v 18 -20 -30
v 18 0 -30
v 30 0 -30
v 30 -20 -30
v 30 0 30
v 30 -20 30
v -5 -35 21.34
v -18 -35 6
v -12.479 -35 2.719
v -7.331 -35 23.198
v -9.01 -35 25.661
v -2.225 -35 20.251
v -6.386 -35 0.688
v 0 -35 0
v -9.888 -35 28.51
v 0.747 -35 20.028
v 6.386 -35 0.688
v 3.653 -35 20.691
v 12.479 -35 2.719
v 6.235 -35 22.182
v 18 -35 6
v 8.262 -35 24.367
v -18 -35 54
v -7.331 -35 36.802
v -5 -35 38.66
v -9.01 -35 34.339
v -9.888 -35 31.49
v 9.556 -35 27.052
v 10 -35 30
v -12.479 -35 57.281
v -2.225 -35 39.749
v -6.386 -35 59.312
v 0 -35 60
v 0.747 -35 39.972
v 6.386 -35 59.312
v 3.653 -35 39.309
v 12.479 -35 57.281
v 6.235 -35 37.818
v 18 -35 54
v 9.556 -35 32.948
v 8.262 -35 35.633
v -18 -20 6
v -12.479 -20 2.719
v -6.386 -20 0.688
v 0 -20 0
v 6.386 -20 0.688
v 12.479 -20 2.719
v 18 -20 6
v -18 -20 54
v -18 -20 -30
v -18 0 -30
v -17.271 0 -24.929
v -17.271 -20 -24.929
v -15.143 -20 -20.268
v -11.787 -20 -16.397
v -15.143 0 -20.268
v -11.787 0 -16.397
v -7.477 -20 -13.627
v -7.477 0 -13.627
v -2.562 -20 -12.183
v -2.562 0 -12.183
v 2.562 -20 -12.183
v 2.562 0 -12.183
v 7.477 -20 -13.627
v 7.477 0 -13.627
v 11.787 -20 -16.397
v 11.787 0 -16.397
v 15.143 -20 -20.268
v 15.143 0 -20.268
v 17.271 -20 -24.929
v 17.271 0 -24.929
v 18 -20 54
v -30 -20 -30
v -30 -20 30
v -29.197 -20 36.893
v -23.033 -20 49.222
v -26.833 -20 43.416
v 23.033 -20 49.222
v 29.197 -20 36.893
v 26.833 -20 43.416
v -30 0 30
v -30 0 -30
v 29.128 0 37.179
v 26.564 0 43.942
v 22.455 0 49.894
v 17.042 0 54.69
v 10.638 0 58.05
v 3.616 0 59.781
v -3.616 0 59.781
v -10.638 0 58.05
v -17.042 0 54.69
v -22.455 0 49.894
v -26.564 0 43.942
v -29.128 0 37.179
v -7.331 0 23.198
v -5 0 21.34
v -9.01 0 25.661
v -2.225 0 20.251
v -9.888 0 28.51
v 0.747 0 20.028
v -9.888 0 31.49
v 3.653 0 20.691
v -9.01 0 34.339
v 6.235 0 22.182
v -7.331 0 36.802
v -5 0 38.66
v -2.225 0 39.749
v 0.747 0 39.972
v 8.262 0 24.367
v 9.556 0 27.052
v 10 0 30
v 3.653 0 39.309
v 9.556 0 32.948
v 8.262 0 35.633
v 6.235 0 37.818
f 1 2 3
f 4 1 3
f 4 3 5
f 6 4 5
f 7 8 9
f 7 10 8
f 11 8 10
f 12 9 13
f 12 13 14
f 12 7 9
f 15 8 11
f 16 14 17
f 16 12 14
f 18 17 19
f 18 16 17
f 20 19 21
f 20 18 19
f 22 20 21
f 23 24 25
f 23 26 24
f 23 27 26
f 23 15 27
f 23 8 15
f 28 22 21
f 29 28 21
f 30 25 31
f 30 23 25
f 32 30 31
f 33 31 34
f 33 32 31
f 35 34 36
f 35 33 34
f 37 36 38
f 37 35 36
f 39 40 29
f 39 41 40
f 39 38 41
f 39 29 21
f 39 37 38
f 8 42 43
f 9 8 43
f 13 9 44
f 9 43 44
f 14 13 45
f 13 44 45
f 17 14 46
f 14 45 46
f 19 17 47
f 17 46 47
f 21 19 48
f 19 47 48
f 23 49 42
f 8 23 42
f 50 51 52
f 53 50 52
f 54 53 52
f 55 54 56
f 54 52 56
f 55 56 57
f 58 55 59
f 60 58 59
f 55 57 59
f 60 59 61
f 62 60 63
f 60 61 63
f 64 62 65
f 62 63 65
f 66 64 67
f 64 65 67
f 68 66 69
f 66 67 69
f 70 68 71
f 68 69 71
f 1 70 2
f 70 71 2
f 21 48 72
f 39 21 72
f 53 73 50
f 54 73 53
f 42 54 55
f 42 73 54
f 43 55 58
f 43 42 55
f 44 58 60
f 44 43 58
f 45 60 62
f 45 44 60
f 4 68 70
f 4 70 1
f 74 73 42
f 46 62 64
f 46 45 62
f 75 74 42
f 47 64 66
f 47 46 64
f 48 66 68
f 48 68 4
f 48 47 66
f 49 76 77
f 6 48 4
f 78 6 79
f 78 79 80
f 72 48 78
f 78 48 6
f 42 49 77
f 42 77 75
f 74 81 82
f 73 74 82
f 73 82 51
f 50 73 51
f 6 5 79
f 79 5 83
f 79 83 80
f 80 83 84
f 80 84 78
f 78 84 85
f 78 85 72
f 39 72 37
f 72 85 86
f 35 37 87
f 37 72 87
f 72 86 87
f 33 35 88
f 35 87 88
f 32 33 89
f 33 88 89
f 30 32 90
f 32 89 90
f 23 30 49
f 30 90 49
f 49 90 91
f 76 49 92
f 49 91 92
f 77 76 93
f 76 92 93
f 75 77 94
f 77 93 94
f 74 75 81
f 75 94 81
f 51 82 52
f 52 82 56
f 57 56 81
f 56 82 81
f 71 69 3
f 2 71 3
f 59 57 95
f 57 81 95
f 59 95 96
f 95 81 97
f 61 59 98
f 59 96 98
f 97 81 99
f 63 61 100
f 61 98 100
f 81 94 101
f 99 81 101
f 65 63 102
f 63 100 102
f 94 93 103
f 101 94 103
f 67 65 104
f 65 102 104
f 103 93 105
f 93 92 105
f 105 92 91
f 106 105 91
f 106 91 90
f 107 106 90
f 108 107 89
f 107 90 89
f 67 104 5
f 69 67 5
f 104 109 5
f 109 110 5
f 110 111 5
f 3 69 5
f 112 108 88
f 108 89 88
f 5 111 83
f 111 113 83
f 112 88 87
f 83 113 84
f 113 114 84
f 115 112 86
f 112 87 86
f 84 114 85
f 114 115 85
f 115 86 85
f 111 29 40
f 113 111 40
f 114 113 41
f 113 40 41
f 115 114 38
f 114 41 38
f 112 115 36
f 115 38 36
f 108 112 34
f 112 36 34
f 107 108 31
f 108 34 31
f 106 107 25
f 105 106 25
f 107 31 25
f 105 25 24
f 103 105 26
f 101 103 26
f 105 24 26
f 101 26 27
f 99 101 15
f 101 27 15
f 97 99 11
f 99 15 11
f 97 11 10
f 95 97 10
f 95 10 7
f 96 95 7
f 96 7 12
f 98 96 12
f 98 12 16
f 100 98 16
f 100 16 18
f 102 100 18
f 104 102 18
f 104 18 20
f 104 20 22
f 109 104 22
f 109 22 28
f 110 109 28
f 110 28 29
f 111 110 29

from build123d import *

# Parameters (mm, degrees)
F1_DEPTH = 20
F3_DEPTH = 15
F4_R     = 10
F5_DEPTH = 35.001


with BuildPart() as f1:
    # F0 (on Front) → F1 (new body)
    with BuildSketch(Plane.XZ):
        with BuildLine():
            Line((18, -30), (30, -30))
            Line((30, -30), (30, 30))
            ThreePointArc((30, 30), (0, 60), (-30, 30))
            Line((-30, 30), (-30, -30))
            Line((-30, -30), (-18, -30))
            ThreePointArc((-18, -30), (0, -12), (18, -30))
        make_face()
    extrude(amount=F1_DEPTH)

    # F2 (on face) → F3 (join)
    with BuildSketch(Plane.XZ.offset(20)):
        with BuildLine():
            Line((-18, 30), (-18, 6))
            ThreePointArc((-18, 6), (0, 0), (18, 6))
            Line((18, 6), (18, 30))
            Line((18, 30), (18, 54))
            ThreePointArc((18, 54), (0, 60), (-18, 54))
            Line((-18, 54), (-18, 30))
        make_face()
    extrude(amount=F3_DEPTH)

    # F4 (on face) → F5 (cut, through all)
    with BuildSketch(Plane.XZ.offset(35)):
        with Locations((0, 30)):
            Circle(F4_R)
    extrude(amount=-F5_DEPTH, mode=Mode.SUBTRACT)


solid = f1.part
